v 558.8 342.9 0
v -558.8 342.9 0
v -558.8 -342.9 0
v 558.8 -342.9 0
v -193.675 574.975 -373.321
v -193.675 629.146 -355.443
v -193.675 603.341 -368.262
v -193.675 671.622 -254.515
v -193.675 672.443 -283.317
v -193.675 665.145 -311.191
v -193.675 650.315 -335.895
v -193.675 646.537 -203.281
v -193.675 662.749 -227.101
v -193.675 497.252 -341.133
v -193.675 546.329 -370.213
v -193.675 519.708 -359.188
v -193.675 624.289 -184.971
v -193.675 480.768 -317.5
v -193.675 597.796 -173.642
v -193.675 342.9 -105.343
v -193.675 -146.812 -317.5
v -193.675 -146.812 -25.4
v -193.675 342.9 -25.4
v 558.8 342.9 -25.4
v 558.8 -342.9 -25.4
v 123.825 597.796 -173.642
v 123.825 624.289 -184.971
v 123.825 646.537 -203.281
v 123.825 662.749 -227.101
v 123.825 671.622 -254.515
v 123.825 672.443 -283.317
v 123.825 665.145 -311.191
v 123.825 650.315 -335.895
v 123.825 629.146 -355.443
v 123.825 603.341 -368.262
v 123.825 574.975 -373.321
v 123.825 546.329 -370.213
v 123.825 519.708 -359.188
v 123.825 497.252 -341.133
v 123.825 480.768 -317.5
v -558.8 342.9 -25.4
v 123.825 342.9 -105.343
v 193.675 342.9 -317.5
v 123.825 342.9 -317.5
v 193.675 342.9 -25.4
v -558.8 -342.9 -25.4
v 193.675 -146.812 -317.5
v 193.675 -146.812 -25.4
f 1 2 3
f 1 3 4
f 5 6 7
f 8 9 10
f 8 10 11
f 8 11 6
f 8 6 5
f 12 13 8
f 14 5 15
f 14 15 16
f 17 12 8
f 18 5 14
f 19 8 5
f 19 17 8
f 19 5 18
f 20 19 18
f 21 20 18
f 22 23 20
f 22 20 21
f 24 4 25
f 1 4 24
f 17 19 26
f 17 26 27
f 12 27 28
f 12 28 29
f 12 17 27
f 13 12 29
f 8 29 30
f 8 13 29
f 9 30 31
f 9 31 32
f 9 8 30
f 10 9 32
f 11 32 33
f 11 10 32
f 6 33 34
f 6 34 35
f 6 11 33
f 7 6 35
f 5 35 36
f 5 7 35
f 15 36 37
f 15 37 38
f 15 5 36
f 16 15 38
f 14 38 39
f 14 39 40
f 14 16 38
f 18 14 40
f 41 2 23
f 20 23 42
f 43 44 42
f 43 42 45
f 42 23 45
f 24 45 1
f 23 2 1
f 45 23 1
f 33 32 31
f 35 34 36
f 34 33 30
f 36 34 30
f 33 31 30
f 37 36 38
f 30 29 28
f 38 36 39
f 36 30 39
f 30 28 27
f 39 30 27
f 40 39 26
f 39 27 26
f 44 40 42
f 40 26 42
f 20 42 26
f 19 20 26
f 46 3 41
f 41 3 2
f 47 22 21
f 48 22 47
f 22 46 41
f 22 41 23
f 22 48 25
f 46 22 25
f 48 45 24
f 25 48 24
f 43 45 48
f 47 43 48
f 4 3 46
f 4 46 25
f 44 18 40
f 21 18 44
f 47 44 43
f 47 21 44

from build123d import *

# Parameters (mm, degrees)
F0_W     = 1117.6
F0_H     = 685.8
F1_DEPTH = 25.4
F2_W     = 387.35
F2_H     = 489.712
F3_DEPTH = 292.1
F5_DEPTH = 317.5


with BuildPart() as f1:
    # F0 (on Top) → F1 (new body)
    with BuildSketch(Plane.XY):
        Rectangle(F0_W, F0_H)
    extrude(amount=-F1_DEPTH)

    # F2 (on face) → F3 (join)
    with BuildSketch(Plane(origin=(0, 0, -25.4), x_dir=(1, 0, 0), z_dir=(0, 0, -1))):
        with Locations((0, -98.044)):
            Rectangle(F2_W, F2_H)
    extrude(amount=F3_DEPTH)

    # F4 (on face) → F5 (join)
    with BuildSketch(Plane(origin=(-193.675, 0, 0), x_dir=(0, -1, 0), z_dir=(-1, 0, 0))):
        with BuildLine():
            Line((-342.9, -105.342755), (-597.796015, -173.641936))
            ThreePointArc((-597.796015, -173.641936), (-650.314815, -335.895403), (-480.768299, -317.5))
            Line((-480.768299, -317.5), (-342.9, -317.5))
            Line((-342.9, -317.5), (-342.9, -105.342755))
        make_face()
    extrude(amount=-F5_DEPTH)


solid = f1.part
